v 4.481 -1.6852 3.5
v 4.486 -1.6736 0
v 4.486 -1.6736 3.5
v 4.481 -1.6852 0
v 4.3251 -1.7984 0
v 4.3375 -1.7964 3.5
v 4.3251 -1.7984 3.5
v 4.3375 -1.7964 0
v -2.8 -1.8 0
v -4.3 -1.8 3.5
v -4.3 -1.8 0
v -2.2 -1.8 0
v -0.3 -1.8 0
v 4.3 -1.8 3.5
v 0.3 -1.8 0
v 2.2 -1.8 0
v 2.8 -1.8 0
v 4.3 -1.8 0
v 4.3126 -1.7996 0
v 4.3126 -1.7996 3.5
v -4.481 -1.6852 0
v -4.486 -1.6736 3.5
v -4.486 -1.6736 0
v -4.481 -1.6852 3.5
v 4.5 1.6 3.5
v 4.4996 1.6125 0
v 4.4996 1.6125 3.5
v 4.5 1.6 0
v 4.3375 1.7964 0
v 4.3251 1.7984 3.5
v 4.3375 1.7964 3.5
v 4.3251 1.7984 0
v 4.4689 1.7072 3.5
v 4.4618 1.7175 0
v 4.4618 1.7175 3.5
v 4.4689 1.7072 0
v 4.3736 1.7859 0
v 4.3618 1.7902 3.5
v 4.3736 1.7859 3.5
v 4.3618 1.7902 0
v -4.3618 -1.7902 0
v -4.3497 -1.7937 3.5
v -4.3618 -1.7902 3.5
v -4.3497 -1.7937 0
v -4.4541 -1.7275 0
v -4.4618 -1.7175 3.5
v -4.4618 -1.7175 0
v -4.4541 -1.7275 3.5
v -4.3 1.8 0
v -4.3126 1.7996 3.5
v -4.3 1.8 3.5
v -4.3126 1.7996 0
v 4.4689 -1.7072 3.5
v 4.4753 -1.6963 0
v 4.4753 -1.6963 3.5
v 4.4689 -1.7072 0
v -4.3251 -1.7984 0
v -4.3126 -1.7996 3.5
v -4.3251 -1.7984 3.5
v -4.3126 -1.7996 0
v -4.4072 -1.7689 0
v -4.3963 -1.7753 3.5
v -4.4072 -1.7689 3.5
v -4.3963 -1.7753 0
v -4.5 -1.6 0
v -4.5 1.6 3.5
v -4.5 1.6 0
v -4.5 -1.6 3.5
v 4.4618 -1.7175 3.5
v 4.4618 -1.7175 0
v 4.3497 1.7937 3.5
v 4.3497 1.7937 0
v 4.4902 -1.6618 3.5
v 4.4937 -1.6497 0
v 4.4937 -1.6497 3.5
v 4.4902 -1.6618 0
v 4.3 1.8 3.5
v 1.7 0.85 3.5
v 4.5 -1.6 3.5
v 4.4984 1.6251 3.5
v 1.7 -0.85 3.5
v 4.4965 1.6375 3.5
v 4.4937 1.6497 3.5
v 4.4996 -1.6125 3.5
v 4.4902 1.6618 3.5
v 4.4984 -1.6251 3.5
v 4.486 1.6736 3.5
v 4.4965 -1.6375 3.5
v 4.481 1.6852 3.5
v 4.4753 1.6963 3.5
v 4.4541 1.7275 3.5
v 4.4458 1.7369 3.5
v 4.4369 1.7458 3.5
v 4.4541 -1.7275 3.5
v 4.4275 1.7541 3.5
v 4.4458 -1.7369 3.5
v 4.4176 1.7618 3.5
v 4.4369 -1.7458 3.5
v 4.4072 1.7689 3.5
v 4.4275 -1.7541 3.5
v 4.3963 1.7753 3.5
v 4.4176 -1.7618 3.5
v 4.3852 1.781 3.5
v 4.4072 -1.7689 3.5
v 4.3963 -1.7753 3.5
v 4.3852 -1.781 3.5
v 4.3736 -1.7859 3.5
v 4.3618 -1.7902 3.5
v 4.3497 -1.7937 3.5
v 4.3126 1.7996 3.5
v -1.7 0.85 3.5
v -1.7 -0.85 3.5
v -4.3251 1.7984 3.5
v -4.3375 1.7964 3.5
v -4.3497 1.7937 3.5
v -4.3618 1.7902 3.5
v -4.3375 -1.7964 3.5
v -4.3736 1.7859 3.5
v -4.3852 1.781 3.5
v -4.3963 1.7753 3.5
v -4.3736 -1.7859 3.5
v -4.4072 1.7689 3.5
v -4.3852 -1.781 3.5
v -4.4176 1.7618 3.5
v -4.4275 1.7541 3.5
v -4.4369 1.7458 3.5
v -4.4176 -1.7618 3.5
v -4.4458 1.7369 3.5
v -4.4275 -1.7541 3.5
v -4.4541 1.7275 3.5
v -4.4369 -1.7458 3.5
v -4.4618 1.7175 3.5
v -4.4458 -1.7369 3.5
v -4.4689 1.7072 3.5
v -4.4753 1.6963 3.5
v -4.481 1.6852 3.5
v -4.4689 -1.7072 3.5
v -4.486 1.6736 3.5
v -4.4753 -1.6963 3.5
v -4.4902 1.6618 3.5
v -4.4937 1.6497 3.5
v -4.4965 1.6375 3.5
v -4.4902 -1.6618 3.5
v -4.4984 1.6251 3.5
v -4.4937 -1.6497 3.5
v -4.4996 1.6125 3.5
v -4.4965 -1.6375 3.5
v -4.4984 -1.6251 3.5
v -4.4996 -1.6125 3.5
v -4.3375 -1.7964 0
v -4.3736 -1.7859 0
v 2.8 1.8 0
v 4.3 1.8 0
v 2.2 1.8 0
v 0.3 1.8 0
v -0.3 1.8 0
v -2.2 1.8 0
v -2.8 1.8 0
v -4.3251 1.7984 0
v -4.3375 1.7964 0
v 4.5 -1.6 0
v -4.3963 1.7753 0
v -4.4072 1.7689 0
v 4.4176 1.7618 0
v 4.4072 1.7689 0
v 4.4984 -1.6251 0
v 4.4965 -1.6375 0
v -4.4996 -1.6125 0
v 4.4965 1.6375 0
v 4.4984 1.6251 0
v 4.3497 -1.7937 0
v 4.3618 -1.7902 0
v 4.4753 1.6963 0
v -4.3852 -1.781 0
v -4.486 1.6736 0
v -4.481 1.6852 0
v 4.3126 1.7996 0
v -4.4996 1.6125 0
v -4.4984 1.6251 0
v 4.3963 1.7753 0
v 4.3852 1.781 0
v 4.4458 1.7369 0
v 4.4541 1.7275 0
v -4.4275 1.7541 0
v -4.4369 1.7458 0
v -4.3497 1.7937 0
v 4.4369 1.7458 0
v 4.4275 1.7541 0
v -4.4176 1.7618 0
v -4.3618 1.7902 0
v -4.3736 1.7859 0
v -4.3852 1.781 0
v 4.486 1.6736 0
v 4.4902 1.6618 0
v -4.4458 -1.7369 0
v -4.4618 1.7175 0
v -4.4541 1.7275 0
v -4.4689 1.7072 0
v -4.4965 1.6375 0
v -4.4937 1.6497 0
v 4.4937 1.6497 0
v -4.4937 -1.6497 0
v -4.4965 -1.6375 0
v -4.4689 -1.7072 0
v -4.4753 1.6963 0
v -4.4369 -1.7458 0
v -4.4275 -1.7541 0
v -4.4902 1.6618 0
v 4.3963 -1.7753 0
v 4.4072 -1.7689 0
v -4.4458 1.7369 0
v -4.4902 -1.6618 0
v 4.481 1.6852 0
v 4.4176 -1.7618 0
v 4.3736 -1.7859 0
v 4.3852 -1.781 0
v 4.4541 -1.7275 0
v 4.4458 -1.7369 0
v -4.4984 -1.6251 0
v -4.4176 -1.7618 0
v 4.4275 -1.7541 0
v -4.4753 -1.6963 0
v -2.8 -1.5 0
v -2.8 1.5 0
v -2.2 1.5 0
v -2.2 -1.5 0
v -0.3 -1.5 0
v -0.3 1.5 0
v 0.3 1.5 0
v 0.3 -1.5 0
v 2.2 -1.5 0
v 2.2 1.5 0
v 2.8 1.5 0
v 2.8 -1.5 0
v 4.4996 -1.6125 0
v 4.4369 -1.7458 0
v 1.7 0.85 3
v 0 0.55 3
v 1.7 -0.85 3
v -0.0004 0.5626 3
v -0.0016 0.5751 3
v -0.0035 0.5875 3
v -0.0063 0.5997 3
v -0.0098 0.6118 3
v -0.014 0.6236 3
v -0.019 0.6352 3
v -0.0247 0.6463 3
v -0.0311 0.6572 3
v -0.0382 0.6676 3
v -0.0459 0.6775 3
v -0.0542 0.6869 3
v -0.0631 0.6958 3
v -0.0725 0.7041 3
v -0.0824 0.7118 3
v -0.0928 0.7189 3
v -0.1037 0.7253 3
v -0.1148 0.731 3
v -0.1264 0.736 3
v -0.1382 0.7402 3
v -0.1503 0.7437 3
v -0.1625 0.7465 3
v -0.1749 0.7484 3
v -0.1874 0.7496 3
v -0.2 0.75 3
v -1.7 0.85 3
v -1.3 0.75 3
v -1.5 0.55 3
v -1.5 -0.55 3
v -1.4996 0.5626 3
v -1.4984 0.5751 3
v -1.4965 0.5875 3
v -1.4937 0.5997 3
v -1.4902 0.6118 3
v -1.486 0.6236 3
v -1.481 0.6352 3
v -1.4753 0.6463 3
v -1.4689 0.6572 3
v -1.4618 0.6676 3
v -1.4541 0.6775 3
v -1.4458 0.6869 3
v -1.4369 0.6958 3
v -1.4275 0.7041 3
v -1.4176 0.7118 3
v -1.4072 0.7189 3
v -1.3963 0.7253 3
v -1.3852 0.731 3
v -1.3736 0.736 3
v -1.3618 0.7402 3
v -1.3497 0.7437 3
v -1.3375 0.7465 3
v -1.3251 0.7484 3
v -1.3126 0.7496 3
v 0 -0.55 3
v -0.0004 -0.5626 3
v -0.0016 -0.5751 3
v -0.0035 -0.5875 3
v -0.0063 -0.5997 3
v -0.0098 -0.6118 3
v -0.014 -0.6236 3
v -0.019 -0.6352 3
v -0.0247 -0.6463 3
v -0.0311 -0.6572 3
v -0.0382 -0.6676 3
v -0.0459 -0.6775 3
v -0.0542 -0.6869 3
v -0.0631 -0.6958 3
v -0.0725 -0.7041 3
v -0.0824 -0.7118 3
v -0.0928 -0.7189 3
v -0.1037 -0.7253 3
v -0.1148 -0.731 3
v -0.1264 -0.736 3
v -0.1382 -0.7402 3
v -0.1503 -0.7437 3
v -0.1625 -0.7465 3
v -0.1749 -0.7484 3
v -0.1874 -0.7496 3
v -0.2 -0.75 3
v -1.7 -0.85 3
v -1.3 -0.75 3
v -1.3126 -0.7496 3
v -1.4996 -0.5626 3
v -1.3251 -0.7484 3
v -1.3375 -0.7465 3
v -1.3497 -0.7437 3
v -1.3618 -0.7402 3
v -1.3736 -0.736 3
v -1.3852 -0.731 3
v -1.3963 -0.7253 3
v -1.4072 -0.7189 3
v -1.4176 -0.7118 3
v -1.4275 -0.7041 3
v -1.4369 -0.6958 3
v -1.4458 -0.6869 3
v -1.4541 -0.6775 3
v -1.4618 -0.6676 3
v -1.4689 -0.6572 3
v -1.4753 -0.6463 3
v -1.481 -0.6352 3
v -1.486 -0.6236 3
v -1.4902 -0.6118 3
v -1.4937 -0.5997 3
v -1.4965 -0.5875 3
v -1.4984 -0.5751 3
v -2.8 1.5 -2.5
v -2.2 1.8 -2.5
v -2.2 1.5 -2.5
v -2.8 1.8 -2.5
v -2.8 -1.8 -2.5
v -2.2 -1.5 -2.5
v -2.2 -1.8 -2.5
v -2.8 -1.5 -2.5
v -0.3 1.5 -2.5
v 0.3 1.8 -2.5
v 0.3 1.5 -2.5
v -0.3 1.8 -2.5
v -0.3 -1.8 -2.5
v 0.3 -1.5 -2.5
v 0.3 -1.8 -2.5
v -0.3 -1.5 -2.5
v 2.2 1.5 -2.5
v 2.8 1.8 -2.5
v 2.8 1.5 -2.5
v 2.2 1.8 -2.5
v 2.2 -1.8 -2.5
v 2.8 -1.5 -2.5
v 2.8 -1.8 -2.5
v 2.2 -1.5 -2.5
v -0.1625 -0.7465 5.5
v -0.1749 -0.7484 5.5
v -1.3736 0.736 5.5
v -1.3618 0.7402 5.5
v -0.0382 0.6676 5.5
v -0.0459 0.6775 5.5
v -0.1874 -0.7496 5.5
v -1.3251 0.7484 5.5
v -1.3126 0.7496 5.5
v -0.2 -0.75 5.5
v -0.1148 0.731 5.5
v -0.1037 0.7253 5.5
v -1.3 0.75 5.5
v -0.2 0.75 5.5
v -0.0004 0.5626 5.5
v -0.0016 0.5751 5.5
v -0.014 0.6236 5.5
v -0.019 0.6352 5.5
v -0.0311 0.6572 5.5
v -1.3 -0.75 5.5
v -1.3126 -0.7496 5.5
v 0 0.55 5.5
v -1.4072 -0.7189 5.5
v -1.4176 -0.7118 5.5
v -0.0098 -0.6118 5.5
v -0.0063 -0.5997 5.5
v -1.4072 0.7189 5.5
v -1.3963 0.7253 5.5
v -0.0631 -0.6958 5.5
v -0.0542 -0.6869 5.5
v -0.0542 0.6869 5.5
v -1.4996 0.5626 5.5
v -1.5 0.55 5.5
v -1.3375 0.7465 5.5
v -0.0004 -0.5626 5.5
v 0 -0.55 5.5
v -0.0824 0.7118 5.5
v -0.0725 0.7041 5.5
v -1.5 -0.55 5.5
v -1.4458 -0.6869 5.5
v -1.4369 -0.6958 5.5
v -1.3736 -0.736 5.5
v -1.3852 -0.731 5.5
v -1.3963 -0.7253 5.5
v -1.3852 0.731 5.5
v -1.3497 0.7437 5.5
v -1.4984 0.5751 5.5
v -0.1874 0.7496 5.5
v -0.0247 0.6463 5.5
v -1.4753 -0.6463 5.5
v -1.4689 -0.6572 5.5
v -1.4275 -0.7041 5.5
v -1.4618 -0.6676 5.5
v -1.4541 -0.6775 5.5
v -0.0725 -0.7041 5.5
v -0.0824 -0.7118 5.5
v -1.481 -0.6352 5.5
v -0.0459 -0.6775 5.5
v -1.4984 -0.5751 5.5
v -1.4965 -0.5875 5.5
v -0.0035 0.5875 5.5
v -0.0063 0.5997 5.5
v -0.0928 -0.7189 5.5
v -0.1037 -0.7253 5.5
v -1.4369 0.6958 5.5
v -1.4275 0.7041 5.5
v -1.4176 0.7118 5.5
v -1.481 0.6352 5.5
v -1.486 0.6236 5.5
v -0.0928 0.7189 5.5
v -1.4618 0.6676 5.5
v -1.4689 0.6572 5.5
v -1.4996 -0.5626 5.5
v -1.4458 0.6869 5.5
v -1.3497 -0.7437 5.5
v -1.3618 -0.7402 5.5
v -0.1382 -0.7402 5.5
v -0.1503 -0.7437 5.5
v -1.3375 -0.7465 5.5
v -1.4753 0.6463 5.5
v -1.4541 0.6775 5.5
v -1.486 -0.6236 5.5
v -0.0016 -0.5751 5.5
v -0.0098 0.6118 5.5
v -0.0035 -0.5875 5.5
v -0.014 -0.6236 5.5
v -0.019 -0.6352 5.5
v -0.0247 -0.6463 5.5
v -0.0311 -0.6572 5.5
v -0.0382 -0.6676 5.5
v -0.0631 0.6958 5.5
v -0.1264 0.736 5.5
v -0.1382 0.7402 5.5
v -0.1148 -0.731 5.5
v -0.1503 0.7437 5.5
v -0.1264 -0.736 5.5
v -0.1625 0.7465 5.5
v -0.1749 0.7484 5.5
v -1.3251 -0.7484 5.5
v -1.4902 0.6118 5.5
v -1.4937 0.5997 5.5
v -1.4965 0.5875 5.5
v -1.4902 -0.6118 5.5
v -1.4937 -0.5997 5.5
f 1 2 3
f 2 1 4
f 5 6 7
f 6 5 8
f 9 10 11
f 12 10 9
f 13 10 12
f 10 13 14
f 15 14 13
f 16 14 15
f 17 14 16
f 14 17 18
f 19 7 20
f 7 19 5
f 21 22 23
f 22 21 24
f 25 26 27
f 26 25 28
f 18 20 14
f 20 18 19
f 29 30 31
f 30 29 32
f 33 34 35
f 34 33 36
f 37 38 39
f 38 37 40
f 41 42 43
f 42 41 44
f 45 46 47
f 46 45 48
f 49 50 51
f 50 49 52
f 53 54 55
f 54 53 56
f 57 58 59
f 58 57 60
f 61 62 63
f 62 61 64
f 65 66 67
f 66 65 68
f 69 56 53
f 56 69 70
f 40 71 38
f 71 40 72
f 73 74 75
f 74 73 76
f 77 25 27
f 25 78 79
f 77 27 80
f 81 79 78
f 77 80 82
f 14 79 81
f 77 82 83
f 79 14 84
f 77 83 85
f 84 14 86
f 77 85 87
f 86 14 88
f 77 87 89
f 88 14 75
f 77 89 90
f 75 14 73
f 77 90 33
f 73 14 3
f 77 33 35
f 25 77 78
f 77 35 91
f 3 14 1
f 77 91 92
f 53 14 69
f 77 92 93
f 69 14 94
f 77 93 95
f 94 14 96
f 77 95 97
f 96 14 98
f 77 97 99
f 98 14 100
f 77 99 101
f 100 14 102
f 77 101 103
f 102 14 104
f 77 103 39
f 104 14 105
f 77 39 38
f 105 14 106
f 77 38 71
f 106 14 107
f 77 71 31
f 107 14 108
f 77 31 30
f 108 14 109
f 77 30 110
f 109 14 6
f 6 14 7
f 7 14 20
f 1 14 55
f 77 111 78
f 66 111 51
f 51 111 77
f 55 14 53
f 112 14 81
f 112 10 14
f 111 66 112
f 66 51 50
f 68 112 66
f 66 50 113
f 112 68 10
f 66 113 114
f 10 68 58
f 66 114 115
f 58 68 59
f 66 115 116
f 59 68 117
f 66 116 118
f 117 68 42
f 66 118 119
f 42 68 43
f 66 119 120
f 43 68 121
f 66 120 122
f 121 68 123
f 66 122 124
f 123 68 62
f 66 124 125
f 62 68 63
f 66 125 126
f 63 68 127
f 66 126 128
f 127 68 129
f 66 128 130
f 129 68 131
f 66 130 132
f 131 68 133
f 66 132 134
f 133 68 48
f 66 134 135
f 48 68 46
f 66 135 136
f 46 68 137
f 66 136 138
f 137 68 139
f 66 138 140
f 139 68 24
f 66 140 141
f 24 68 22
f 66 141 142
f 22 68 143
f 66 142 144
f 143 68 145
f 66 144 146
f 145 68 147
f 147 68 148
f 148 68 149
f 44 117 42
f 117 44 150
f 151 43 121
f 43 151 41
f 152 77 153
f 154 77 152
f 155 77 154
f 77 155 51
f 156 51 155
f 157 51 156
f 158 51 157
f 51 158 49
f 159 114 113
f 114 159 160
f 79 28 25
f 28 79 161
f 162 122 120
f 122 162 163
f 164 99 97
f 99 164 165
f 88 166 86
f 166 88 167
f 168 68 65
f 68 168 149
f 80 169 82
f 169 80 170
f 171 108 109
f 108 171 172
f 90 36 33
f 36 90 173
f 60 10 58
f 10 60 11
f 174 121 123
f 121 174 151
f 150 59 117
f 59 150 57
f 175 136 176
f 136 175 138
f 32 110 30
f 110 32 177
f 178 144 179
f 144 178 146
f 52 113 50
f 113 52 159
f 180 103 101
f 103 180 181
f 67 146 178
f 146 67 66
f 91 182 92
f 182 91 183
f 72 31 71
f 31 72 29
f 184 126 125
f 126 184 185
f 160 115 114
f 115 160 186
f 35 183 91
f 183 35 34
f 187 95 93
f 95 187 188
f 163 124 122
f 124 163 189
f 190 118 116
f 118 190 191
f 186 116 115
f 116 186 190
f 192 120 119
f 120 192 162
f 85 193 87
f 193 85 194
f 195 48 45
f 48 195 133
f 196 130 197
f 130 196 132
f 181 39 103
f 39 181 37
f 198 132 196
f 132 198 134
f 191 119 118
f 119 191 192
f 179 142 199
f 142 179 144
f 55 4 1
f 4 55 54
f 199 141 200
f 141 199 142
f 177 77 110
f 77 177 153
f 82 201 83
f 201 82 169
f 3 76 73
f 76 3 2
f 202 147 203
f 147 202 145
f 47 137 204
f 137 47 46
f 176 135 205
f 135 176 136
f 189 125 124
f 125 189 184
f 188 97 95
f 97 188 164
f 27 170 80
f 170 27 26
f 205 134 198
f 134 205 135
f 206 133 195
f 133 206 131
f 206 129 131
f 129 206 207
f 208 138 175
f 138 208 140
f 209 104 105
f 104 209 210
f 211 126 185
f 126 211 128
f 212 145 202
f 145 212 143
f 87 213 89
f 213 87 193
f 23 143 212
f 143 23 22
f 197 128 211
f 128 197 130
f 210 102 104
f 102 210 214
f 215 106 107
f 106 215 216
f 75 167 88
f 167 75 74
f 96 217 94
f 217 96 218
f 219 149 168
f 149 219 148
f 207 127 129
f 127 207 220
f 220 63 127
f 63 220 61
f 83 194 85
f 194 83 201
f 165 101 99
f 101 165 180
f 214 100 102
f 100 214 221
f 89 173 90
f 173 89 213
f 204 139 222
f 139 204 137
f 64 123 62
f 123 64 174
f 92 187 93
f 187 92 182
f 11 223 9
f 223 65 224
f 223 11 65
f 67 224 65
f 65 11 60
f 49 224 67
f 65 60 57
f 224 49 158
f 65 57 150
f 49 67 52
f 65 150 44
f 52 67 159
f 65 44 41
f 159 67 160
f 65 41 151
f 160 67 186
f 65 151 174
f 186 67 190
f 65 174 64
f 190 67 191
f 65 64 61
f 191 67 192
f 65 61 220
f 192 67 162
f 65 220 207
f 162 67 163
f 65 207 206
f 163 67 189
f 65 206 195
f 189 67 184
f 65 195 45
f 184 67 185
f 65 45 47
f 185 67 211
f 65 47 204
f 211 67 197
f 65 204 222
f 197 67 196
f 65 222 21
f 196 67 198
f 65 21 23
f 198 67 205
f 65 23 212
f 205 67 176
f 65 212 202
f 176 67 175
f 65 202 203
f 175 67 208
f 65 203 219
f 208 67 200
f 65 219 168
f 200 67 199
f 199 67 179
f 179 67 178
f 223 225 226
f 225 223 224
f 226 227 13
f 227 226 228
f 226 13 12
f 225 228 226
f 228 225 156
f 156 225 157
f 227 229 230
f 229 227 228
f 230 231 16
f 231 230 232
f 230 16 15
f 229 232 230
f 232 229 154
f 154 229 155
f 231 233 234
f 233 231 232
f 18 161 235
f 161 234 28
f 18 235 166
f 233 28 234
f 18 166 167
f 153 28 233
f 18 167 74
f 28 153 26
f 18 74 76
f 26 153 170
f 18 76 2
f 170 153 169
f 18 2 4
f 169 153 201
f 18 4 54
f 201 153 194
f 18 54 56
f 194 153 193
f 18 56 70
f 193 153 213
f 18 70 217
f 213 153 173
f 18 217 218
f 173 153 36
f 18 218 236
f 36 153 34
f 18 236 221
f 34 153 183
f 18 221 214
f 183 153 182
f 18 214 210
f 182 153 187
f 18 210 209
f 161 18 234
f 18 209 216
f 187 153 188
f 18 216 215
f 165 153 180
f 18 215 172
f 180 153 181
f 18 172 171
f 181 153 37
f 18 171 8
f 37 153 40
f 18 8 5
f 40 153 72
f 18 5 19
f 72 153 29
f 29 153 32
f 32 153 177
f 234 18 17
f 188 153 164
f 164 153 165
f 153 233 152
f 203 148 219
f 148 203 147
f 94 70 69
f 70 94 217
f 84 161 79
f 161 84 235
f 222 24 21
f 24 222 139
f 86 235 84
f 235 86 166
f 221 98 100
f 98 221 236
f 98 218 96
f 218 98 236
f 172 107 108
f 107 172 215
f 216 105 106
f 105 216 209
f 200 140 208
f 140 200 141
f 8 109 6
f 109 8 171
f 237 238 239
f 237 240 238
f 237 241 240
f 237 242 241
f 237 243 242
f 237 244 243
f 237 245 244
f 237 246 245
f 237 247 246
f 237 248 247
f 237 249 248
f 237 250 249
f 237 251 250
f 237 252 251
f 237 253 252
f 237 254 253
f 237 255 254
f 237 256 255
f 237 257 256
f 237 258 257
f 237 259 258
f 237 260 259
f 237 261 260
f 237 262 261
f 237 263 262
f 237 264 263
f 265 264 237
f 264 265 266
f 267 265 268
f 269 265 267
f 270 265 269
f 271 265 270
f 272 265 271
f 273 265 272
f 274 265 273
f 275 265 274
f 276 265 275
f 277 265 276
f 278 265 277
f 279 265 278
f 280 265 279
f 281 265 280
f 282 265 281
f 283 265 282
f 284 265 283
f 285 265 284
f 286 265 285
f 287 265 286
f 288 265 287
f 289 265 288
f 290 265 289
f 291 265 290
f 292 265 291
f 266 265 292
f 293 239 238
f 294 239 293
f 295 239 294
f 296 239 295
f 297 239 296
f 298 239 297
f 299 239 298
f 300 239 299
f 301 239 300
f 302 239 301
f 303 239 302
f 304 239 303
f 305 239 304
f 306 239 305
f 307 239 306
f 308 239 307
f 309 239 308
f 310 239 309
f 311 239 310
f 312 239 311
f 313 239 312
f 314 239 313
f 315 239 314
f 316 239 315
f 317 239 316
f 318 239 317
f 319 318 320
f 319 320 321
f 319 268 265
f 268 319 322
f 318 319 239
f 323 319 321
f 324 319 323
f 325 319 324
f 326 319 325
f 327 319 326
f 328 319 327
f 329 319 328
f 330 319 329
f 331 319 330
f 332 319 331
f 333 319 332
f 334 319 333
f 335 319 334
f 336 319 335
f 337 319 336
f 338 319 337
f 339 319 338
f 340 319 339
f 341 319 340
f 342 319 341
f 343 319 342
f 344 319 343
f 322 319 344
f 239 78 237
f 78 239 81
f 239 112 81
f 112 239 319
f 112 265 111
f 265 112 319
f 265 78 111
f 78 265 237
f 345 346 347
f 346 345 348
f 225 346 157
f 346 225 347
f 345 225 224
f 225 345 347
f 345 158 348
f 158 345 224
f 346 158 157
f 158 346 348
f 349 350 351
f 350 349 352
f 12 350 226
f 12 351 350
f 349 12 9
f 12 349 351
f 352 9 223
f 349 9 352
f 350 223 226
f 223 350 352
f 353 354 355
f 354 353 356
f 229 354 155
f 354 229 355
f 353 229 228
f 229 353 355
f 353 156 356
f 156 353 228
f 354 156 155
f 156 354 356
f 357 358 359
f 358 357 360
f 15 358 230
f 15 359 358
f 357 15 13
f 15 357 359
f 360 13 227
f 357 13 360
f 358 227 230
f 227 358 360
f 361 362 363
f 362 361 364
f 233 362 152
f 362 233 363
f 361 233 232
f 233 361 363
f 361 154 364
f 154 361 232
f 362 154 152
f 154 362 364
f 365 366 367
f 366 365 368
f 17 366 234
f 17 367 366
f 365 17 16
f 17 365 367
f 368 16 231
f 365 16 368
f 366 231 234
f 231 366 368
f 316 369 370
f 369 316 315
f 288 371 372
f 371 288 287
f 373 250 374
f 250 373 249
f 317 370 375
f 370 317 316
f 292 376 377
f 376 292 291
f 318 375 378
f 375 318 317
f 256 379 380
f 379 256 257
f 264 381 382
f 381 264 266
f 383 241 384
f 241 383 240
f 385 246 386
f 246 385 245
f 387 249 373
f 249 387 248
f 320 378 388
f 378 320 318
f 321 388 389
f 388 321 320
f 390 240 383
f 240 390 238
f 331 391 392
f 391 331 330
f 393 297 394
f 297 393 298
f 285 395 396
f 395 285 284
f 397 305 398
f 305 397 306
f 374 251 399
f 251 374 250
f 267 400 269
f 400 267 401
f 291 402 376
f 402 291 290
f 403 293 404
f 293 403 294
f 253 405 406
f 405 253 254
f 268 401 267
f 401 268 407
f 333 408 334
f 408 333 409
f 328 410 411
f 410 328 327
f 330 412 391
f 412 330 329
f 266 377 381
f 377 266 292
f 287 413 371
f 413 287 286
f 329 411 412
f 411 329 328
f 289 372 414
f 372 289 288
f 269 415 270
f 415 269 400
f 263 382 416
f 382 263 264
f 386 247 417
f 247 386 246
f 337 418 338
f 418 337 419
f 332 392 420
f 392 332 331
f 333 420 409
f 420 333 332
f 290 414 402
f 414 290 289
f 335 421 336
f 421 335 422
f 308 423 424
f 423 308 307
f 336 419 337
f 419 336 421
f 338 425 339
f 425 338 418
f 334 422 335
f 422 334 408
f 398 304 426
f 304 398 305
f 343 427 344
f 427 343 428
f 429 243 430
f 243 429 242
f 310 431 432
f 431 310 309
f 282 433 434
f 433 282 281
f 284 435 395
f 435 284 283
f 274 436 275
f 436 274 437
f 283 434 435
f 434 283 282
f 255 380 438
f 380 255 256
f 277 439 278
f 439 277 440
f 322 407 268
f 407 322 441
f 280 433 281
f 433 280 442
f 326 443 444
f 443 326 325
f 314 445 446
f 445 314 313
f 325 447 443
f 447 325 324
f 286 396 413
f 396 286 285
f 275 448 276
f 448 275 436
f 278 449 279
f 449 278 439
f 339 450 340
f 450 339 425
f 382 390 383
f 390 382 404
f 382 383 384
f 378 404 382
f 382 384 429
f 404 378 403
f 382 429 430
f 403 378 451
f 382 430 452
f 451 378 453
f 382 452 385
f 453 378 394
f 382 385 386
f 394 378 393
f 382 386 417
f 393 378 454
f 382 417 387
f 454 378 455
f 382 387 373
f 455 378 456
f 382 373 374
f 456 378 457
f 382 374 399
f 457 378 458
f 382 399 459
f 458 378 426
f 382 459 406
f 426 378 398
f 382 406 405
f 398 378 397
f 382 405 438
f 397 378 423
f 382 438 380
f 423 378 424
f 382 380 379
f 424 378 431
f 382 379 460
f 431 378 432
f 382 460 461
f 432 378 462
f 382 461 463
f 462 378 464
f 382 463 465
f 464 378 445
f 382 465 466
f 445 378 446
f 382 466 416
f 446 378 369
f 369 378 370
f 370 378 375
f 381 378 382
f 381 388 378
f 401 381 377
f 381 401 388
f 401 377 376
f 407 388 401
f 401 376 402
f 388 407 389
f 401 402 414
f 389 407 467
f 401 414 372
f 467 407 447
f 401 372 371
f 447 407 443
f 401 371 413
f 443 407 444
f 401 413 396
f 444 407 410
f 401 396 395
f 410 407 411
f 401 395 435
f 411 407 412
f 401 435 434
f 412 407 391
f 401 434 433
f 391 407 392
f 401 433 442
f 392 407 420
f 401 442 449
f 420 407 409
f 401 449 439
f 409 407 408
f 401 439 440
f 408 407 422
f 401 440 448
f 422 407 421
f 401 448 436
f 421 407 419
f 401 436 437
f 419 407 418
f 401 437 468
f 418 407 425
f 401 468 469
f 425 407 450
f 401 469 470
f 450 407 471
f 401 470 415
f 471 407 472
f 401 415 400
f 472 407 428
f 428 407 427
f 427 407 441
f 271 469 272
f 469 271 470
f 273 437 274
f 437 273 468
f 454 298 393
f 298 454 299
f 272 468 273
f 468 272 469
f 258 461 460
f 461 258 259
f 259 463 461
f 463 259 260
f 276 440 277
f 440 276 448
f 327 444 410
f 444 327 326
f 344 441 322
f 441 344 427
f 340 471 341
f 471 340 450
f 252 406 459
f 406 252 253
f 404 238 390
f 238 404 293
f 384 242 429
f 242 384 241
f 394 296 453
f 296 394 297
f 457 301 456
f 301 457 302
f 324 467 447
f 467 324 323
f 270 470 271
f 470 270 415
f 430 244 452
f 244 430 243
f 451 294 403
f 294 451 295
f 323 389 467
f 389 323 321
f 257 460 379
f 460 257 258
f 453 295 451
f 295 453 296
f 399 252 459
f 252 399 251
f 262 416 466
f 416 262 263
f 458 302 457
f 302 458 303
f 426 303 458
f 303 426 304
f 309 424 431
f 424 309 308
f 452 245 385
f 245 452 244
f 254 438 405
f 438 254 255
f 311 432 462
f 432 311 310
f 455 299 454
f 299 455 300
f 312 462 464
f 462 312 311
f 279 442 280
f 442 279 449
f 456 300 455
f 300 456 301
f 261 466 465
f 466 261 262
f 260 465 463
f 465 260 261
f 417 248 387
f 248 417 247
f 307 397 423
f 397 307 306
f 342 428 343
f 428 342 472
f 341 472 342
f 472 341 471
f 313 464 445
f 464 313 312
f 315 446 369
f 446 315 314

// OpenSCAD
$fn = 100;

module rcube (size, r = 0, center = false) {
    linear_extrude(size[2]) {
        offset(r = r)
          offset(r = - r)
            square([size[0], size[1]], center = center);
    }
}

difference () {
  rcube([9, 3.6, 3.5], r = 0.2, center = true);
  translate([0, 0, 3.5 - 0.5]) rcube([3.4, 1.7, 0.5], center = true);
}

translate([- 1.5 / 2, 0, 3.5 - 0.5]) rcube([1.5, 1.5, 2 + 0.5], r = 0.2, center = true);

for (i = [-1, 0, 1]) {
    translate([i * 2.5, 3.6 / 2 - 0.3 / 2, -2.5]) rcube([0.6, 0.3, 2.5], center = true);
    translate([i * 2.5, - 3.6 / 2 + 0.3 / 2, -2.5]) rcube([0.6, 0.3, 2.5], center = true);
}
